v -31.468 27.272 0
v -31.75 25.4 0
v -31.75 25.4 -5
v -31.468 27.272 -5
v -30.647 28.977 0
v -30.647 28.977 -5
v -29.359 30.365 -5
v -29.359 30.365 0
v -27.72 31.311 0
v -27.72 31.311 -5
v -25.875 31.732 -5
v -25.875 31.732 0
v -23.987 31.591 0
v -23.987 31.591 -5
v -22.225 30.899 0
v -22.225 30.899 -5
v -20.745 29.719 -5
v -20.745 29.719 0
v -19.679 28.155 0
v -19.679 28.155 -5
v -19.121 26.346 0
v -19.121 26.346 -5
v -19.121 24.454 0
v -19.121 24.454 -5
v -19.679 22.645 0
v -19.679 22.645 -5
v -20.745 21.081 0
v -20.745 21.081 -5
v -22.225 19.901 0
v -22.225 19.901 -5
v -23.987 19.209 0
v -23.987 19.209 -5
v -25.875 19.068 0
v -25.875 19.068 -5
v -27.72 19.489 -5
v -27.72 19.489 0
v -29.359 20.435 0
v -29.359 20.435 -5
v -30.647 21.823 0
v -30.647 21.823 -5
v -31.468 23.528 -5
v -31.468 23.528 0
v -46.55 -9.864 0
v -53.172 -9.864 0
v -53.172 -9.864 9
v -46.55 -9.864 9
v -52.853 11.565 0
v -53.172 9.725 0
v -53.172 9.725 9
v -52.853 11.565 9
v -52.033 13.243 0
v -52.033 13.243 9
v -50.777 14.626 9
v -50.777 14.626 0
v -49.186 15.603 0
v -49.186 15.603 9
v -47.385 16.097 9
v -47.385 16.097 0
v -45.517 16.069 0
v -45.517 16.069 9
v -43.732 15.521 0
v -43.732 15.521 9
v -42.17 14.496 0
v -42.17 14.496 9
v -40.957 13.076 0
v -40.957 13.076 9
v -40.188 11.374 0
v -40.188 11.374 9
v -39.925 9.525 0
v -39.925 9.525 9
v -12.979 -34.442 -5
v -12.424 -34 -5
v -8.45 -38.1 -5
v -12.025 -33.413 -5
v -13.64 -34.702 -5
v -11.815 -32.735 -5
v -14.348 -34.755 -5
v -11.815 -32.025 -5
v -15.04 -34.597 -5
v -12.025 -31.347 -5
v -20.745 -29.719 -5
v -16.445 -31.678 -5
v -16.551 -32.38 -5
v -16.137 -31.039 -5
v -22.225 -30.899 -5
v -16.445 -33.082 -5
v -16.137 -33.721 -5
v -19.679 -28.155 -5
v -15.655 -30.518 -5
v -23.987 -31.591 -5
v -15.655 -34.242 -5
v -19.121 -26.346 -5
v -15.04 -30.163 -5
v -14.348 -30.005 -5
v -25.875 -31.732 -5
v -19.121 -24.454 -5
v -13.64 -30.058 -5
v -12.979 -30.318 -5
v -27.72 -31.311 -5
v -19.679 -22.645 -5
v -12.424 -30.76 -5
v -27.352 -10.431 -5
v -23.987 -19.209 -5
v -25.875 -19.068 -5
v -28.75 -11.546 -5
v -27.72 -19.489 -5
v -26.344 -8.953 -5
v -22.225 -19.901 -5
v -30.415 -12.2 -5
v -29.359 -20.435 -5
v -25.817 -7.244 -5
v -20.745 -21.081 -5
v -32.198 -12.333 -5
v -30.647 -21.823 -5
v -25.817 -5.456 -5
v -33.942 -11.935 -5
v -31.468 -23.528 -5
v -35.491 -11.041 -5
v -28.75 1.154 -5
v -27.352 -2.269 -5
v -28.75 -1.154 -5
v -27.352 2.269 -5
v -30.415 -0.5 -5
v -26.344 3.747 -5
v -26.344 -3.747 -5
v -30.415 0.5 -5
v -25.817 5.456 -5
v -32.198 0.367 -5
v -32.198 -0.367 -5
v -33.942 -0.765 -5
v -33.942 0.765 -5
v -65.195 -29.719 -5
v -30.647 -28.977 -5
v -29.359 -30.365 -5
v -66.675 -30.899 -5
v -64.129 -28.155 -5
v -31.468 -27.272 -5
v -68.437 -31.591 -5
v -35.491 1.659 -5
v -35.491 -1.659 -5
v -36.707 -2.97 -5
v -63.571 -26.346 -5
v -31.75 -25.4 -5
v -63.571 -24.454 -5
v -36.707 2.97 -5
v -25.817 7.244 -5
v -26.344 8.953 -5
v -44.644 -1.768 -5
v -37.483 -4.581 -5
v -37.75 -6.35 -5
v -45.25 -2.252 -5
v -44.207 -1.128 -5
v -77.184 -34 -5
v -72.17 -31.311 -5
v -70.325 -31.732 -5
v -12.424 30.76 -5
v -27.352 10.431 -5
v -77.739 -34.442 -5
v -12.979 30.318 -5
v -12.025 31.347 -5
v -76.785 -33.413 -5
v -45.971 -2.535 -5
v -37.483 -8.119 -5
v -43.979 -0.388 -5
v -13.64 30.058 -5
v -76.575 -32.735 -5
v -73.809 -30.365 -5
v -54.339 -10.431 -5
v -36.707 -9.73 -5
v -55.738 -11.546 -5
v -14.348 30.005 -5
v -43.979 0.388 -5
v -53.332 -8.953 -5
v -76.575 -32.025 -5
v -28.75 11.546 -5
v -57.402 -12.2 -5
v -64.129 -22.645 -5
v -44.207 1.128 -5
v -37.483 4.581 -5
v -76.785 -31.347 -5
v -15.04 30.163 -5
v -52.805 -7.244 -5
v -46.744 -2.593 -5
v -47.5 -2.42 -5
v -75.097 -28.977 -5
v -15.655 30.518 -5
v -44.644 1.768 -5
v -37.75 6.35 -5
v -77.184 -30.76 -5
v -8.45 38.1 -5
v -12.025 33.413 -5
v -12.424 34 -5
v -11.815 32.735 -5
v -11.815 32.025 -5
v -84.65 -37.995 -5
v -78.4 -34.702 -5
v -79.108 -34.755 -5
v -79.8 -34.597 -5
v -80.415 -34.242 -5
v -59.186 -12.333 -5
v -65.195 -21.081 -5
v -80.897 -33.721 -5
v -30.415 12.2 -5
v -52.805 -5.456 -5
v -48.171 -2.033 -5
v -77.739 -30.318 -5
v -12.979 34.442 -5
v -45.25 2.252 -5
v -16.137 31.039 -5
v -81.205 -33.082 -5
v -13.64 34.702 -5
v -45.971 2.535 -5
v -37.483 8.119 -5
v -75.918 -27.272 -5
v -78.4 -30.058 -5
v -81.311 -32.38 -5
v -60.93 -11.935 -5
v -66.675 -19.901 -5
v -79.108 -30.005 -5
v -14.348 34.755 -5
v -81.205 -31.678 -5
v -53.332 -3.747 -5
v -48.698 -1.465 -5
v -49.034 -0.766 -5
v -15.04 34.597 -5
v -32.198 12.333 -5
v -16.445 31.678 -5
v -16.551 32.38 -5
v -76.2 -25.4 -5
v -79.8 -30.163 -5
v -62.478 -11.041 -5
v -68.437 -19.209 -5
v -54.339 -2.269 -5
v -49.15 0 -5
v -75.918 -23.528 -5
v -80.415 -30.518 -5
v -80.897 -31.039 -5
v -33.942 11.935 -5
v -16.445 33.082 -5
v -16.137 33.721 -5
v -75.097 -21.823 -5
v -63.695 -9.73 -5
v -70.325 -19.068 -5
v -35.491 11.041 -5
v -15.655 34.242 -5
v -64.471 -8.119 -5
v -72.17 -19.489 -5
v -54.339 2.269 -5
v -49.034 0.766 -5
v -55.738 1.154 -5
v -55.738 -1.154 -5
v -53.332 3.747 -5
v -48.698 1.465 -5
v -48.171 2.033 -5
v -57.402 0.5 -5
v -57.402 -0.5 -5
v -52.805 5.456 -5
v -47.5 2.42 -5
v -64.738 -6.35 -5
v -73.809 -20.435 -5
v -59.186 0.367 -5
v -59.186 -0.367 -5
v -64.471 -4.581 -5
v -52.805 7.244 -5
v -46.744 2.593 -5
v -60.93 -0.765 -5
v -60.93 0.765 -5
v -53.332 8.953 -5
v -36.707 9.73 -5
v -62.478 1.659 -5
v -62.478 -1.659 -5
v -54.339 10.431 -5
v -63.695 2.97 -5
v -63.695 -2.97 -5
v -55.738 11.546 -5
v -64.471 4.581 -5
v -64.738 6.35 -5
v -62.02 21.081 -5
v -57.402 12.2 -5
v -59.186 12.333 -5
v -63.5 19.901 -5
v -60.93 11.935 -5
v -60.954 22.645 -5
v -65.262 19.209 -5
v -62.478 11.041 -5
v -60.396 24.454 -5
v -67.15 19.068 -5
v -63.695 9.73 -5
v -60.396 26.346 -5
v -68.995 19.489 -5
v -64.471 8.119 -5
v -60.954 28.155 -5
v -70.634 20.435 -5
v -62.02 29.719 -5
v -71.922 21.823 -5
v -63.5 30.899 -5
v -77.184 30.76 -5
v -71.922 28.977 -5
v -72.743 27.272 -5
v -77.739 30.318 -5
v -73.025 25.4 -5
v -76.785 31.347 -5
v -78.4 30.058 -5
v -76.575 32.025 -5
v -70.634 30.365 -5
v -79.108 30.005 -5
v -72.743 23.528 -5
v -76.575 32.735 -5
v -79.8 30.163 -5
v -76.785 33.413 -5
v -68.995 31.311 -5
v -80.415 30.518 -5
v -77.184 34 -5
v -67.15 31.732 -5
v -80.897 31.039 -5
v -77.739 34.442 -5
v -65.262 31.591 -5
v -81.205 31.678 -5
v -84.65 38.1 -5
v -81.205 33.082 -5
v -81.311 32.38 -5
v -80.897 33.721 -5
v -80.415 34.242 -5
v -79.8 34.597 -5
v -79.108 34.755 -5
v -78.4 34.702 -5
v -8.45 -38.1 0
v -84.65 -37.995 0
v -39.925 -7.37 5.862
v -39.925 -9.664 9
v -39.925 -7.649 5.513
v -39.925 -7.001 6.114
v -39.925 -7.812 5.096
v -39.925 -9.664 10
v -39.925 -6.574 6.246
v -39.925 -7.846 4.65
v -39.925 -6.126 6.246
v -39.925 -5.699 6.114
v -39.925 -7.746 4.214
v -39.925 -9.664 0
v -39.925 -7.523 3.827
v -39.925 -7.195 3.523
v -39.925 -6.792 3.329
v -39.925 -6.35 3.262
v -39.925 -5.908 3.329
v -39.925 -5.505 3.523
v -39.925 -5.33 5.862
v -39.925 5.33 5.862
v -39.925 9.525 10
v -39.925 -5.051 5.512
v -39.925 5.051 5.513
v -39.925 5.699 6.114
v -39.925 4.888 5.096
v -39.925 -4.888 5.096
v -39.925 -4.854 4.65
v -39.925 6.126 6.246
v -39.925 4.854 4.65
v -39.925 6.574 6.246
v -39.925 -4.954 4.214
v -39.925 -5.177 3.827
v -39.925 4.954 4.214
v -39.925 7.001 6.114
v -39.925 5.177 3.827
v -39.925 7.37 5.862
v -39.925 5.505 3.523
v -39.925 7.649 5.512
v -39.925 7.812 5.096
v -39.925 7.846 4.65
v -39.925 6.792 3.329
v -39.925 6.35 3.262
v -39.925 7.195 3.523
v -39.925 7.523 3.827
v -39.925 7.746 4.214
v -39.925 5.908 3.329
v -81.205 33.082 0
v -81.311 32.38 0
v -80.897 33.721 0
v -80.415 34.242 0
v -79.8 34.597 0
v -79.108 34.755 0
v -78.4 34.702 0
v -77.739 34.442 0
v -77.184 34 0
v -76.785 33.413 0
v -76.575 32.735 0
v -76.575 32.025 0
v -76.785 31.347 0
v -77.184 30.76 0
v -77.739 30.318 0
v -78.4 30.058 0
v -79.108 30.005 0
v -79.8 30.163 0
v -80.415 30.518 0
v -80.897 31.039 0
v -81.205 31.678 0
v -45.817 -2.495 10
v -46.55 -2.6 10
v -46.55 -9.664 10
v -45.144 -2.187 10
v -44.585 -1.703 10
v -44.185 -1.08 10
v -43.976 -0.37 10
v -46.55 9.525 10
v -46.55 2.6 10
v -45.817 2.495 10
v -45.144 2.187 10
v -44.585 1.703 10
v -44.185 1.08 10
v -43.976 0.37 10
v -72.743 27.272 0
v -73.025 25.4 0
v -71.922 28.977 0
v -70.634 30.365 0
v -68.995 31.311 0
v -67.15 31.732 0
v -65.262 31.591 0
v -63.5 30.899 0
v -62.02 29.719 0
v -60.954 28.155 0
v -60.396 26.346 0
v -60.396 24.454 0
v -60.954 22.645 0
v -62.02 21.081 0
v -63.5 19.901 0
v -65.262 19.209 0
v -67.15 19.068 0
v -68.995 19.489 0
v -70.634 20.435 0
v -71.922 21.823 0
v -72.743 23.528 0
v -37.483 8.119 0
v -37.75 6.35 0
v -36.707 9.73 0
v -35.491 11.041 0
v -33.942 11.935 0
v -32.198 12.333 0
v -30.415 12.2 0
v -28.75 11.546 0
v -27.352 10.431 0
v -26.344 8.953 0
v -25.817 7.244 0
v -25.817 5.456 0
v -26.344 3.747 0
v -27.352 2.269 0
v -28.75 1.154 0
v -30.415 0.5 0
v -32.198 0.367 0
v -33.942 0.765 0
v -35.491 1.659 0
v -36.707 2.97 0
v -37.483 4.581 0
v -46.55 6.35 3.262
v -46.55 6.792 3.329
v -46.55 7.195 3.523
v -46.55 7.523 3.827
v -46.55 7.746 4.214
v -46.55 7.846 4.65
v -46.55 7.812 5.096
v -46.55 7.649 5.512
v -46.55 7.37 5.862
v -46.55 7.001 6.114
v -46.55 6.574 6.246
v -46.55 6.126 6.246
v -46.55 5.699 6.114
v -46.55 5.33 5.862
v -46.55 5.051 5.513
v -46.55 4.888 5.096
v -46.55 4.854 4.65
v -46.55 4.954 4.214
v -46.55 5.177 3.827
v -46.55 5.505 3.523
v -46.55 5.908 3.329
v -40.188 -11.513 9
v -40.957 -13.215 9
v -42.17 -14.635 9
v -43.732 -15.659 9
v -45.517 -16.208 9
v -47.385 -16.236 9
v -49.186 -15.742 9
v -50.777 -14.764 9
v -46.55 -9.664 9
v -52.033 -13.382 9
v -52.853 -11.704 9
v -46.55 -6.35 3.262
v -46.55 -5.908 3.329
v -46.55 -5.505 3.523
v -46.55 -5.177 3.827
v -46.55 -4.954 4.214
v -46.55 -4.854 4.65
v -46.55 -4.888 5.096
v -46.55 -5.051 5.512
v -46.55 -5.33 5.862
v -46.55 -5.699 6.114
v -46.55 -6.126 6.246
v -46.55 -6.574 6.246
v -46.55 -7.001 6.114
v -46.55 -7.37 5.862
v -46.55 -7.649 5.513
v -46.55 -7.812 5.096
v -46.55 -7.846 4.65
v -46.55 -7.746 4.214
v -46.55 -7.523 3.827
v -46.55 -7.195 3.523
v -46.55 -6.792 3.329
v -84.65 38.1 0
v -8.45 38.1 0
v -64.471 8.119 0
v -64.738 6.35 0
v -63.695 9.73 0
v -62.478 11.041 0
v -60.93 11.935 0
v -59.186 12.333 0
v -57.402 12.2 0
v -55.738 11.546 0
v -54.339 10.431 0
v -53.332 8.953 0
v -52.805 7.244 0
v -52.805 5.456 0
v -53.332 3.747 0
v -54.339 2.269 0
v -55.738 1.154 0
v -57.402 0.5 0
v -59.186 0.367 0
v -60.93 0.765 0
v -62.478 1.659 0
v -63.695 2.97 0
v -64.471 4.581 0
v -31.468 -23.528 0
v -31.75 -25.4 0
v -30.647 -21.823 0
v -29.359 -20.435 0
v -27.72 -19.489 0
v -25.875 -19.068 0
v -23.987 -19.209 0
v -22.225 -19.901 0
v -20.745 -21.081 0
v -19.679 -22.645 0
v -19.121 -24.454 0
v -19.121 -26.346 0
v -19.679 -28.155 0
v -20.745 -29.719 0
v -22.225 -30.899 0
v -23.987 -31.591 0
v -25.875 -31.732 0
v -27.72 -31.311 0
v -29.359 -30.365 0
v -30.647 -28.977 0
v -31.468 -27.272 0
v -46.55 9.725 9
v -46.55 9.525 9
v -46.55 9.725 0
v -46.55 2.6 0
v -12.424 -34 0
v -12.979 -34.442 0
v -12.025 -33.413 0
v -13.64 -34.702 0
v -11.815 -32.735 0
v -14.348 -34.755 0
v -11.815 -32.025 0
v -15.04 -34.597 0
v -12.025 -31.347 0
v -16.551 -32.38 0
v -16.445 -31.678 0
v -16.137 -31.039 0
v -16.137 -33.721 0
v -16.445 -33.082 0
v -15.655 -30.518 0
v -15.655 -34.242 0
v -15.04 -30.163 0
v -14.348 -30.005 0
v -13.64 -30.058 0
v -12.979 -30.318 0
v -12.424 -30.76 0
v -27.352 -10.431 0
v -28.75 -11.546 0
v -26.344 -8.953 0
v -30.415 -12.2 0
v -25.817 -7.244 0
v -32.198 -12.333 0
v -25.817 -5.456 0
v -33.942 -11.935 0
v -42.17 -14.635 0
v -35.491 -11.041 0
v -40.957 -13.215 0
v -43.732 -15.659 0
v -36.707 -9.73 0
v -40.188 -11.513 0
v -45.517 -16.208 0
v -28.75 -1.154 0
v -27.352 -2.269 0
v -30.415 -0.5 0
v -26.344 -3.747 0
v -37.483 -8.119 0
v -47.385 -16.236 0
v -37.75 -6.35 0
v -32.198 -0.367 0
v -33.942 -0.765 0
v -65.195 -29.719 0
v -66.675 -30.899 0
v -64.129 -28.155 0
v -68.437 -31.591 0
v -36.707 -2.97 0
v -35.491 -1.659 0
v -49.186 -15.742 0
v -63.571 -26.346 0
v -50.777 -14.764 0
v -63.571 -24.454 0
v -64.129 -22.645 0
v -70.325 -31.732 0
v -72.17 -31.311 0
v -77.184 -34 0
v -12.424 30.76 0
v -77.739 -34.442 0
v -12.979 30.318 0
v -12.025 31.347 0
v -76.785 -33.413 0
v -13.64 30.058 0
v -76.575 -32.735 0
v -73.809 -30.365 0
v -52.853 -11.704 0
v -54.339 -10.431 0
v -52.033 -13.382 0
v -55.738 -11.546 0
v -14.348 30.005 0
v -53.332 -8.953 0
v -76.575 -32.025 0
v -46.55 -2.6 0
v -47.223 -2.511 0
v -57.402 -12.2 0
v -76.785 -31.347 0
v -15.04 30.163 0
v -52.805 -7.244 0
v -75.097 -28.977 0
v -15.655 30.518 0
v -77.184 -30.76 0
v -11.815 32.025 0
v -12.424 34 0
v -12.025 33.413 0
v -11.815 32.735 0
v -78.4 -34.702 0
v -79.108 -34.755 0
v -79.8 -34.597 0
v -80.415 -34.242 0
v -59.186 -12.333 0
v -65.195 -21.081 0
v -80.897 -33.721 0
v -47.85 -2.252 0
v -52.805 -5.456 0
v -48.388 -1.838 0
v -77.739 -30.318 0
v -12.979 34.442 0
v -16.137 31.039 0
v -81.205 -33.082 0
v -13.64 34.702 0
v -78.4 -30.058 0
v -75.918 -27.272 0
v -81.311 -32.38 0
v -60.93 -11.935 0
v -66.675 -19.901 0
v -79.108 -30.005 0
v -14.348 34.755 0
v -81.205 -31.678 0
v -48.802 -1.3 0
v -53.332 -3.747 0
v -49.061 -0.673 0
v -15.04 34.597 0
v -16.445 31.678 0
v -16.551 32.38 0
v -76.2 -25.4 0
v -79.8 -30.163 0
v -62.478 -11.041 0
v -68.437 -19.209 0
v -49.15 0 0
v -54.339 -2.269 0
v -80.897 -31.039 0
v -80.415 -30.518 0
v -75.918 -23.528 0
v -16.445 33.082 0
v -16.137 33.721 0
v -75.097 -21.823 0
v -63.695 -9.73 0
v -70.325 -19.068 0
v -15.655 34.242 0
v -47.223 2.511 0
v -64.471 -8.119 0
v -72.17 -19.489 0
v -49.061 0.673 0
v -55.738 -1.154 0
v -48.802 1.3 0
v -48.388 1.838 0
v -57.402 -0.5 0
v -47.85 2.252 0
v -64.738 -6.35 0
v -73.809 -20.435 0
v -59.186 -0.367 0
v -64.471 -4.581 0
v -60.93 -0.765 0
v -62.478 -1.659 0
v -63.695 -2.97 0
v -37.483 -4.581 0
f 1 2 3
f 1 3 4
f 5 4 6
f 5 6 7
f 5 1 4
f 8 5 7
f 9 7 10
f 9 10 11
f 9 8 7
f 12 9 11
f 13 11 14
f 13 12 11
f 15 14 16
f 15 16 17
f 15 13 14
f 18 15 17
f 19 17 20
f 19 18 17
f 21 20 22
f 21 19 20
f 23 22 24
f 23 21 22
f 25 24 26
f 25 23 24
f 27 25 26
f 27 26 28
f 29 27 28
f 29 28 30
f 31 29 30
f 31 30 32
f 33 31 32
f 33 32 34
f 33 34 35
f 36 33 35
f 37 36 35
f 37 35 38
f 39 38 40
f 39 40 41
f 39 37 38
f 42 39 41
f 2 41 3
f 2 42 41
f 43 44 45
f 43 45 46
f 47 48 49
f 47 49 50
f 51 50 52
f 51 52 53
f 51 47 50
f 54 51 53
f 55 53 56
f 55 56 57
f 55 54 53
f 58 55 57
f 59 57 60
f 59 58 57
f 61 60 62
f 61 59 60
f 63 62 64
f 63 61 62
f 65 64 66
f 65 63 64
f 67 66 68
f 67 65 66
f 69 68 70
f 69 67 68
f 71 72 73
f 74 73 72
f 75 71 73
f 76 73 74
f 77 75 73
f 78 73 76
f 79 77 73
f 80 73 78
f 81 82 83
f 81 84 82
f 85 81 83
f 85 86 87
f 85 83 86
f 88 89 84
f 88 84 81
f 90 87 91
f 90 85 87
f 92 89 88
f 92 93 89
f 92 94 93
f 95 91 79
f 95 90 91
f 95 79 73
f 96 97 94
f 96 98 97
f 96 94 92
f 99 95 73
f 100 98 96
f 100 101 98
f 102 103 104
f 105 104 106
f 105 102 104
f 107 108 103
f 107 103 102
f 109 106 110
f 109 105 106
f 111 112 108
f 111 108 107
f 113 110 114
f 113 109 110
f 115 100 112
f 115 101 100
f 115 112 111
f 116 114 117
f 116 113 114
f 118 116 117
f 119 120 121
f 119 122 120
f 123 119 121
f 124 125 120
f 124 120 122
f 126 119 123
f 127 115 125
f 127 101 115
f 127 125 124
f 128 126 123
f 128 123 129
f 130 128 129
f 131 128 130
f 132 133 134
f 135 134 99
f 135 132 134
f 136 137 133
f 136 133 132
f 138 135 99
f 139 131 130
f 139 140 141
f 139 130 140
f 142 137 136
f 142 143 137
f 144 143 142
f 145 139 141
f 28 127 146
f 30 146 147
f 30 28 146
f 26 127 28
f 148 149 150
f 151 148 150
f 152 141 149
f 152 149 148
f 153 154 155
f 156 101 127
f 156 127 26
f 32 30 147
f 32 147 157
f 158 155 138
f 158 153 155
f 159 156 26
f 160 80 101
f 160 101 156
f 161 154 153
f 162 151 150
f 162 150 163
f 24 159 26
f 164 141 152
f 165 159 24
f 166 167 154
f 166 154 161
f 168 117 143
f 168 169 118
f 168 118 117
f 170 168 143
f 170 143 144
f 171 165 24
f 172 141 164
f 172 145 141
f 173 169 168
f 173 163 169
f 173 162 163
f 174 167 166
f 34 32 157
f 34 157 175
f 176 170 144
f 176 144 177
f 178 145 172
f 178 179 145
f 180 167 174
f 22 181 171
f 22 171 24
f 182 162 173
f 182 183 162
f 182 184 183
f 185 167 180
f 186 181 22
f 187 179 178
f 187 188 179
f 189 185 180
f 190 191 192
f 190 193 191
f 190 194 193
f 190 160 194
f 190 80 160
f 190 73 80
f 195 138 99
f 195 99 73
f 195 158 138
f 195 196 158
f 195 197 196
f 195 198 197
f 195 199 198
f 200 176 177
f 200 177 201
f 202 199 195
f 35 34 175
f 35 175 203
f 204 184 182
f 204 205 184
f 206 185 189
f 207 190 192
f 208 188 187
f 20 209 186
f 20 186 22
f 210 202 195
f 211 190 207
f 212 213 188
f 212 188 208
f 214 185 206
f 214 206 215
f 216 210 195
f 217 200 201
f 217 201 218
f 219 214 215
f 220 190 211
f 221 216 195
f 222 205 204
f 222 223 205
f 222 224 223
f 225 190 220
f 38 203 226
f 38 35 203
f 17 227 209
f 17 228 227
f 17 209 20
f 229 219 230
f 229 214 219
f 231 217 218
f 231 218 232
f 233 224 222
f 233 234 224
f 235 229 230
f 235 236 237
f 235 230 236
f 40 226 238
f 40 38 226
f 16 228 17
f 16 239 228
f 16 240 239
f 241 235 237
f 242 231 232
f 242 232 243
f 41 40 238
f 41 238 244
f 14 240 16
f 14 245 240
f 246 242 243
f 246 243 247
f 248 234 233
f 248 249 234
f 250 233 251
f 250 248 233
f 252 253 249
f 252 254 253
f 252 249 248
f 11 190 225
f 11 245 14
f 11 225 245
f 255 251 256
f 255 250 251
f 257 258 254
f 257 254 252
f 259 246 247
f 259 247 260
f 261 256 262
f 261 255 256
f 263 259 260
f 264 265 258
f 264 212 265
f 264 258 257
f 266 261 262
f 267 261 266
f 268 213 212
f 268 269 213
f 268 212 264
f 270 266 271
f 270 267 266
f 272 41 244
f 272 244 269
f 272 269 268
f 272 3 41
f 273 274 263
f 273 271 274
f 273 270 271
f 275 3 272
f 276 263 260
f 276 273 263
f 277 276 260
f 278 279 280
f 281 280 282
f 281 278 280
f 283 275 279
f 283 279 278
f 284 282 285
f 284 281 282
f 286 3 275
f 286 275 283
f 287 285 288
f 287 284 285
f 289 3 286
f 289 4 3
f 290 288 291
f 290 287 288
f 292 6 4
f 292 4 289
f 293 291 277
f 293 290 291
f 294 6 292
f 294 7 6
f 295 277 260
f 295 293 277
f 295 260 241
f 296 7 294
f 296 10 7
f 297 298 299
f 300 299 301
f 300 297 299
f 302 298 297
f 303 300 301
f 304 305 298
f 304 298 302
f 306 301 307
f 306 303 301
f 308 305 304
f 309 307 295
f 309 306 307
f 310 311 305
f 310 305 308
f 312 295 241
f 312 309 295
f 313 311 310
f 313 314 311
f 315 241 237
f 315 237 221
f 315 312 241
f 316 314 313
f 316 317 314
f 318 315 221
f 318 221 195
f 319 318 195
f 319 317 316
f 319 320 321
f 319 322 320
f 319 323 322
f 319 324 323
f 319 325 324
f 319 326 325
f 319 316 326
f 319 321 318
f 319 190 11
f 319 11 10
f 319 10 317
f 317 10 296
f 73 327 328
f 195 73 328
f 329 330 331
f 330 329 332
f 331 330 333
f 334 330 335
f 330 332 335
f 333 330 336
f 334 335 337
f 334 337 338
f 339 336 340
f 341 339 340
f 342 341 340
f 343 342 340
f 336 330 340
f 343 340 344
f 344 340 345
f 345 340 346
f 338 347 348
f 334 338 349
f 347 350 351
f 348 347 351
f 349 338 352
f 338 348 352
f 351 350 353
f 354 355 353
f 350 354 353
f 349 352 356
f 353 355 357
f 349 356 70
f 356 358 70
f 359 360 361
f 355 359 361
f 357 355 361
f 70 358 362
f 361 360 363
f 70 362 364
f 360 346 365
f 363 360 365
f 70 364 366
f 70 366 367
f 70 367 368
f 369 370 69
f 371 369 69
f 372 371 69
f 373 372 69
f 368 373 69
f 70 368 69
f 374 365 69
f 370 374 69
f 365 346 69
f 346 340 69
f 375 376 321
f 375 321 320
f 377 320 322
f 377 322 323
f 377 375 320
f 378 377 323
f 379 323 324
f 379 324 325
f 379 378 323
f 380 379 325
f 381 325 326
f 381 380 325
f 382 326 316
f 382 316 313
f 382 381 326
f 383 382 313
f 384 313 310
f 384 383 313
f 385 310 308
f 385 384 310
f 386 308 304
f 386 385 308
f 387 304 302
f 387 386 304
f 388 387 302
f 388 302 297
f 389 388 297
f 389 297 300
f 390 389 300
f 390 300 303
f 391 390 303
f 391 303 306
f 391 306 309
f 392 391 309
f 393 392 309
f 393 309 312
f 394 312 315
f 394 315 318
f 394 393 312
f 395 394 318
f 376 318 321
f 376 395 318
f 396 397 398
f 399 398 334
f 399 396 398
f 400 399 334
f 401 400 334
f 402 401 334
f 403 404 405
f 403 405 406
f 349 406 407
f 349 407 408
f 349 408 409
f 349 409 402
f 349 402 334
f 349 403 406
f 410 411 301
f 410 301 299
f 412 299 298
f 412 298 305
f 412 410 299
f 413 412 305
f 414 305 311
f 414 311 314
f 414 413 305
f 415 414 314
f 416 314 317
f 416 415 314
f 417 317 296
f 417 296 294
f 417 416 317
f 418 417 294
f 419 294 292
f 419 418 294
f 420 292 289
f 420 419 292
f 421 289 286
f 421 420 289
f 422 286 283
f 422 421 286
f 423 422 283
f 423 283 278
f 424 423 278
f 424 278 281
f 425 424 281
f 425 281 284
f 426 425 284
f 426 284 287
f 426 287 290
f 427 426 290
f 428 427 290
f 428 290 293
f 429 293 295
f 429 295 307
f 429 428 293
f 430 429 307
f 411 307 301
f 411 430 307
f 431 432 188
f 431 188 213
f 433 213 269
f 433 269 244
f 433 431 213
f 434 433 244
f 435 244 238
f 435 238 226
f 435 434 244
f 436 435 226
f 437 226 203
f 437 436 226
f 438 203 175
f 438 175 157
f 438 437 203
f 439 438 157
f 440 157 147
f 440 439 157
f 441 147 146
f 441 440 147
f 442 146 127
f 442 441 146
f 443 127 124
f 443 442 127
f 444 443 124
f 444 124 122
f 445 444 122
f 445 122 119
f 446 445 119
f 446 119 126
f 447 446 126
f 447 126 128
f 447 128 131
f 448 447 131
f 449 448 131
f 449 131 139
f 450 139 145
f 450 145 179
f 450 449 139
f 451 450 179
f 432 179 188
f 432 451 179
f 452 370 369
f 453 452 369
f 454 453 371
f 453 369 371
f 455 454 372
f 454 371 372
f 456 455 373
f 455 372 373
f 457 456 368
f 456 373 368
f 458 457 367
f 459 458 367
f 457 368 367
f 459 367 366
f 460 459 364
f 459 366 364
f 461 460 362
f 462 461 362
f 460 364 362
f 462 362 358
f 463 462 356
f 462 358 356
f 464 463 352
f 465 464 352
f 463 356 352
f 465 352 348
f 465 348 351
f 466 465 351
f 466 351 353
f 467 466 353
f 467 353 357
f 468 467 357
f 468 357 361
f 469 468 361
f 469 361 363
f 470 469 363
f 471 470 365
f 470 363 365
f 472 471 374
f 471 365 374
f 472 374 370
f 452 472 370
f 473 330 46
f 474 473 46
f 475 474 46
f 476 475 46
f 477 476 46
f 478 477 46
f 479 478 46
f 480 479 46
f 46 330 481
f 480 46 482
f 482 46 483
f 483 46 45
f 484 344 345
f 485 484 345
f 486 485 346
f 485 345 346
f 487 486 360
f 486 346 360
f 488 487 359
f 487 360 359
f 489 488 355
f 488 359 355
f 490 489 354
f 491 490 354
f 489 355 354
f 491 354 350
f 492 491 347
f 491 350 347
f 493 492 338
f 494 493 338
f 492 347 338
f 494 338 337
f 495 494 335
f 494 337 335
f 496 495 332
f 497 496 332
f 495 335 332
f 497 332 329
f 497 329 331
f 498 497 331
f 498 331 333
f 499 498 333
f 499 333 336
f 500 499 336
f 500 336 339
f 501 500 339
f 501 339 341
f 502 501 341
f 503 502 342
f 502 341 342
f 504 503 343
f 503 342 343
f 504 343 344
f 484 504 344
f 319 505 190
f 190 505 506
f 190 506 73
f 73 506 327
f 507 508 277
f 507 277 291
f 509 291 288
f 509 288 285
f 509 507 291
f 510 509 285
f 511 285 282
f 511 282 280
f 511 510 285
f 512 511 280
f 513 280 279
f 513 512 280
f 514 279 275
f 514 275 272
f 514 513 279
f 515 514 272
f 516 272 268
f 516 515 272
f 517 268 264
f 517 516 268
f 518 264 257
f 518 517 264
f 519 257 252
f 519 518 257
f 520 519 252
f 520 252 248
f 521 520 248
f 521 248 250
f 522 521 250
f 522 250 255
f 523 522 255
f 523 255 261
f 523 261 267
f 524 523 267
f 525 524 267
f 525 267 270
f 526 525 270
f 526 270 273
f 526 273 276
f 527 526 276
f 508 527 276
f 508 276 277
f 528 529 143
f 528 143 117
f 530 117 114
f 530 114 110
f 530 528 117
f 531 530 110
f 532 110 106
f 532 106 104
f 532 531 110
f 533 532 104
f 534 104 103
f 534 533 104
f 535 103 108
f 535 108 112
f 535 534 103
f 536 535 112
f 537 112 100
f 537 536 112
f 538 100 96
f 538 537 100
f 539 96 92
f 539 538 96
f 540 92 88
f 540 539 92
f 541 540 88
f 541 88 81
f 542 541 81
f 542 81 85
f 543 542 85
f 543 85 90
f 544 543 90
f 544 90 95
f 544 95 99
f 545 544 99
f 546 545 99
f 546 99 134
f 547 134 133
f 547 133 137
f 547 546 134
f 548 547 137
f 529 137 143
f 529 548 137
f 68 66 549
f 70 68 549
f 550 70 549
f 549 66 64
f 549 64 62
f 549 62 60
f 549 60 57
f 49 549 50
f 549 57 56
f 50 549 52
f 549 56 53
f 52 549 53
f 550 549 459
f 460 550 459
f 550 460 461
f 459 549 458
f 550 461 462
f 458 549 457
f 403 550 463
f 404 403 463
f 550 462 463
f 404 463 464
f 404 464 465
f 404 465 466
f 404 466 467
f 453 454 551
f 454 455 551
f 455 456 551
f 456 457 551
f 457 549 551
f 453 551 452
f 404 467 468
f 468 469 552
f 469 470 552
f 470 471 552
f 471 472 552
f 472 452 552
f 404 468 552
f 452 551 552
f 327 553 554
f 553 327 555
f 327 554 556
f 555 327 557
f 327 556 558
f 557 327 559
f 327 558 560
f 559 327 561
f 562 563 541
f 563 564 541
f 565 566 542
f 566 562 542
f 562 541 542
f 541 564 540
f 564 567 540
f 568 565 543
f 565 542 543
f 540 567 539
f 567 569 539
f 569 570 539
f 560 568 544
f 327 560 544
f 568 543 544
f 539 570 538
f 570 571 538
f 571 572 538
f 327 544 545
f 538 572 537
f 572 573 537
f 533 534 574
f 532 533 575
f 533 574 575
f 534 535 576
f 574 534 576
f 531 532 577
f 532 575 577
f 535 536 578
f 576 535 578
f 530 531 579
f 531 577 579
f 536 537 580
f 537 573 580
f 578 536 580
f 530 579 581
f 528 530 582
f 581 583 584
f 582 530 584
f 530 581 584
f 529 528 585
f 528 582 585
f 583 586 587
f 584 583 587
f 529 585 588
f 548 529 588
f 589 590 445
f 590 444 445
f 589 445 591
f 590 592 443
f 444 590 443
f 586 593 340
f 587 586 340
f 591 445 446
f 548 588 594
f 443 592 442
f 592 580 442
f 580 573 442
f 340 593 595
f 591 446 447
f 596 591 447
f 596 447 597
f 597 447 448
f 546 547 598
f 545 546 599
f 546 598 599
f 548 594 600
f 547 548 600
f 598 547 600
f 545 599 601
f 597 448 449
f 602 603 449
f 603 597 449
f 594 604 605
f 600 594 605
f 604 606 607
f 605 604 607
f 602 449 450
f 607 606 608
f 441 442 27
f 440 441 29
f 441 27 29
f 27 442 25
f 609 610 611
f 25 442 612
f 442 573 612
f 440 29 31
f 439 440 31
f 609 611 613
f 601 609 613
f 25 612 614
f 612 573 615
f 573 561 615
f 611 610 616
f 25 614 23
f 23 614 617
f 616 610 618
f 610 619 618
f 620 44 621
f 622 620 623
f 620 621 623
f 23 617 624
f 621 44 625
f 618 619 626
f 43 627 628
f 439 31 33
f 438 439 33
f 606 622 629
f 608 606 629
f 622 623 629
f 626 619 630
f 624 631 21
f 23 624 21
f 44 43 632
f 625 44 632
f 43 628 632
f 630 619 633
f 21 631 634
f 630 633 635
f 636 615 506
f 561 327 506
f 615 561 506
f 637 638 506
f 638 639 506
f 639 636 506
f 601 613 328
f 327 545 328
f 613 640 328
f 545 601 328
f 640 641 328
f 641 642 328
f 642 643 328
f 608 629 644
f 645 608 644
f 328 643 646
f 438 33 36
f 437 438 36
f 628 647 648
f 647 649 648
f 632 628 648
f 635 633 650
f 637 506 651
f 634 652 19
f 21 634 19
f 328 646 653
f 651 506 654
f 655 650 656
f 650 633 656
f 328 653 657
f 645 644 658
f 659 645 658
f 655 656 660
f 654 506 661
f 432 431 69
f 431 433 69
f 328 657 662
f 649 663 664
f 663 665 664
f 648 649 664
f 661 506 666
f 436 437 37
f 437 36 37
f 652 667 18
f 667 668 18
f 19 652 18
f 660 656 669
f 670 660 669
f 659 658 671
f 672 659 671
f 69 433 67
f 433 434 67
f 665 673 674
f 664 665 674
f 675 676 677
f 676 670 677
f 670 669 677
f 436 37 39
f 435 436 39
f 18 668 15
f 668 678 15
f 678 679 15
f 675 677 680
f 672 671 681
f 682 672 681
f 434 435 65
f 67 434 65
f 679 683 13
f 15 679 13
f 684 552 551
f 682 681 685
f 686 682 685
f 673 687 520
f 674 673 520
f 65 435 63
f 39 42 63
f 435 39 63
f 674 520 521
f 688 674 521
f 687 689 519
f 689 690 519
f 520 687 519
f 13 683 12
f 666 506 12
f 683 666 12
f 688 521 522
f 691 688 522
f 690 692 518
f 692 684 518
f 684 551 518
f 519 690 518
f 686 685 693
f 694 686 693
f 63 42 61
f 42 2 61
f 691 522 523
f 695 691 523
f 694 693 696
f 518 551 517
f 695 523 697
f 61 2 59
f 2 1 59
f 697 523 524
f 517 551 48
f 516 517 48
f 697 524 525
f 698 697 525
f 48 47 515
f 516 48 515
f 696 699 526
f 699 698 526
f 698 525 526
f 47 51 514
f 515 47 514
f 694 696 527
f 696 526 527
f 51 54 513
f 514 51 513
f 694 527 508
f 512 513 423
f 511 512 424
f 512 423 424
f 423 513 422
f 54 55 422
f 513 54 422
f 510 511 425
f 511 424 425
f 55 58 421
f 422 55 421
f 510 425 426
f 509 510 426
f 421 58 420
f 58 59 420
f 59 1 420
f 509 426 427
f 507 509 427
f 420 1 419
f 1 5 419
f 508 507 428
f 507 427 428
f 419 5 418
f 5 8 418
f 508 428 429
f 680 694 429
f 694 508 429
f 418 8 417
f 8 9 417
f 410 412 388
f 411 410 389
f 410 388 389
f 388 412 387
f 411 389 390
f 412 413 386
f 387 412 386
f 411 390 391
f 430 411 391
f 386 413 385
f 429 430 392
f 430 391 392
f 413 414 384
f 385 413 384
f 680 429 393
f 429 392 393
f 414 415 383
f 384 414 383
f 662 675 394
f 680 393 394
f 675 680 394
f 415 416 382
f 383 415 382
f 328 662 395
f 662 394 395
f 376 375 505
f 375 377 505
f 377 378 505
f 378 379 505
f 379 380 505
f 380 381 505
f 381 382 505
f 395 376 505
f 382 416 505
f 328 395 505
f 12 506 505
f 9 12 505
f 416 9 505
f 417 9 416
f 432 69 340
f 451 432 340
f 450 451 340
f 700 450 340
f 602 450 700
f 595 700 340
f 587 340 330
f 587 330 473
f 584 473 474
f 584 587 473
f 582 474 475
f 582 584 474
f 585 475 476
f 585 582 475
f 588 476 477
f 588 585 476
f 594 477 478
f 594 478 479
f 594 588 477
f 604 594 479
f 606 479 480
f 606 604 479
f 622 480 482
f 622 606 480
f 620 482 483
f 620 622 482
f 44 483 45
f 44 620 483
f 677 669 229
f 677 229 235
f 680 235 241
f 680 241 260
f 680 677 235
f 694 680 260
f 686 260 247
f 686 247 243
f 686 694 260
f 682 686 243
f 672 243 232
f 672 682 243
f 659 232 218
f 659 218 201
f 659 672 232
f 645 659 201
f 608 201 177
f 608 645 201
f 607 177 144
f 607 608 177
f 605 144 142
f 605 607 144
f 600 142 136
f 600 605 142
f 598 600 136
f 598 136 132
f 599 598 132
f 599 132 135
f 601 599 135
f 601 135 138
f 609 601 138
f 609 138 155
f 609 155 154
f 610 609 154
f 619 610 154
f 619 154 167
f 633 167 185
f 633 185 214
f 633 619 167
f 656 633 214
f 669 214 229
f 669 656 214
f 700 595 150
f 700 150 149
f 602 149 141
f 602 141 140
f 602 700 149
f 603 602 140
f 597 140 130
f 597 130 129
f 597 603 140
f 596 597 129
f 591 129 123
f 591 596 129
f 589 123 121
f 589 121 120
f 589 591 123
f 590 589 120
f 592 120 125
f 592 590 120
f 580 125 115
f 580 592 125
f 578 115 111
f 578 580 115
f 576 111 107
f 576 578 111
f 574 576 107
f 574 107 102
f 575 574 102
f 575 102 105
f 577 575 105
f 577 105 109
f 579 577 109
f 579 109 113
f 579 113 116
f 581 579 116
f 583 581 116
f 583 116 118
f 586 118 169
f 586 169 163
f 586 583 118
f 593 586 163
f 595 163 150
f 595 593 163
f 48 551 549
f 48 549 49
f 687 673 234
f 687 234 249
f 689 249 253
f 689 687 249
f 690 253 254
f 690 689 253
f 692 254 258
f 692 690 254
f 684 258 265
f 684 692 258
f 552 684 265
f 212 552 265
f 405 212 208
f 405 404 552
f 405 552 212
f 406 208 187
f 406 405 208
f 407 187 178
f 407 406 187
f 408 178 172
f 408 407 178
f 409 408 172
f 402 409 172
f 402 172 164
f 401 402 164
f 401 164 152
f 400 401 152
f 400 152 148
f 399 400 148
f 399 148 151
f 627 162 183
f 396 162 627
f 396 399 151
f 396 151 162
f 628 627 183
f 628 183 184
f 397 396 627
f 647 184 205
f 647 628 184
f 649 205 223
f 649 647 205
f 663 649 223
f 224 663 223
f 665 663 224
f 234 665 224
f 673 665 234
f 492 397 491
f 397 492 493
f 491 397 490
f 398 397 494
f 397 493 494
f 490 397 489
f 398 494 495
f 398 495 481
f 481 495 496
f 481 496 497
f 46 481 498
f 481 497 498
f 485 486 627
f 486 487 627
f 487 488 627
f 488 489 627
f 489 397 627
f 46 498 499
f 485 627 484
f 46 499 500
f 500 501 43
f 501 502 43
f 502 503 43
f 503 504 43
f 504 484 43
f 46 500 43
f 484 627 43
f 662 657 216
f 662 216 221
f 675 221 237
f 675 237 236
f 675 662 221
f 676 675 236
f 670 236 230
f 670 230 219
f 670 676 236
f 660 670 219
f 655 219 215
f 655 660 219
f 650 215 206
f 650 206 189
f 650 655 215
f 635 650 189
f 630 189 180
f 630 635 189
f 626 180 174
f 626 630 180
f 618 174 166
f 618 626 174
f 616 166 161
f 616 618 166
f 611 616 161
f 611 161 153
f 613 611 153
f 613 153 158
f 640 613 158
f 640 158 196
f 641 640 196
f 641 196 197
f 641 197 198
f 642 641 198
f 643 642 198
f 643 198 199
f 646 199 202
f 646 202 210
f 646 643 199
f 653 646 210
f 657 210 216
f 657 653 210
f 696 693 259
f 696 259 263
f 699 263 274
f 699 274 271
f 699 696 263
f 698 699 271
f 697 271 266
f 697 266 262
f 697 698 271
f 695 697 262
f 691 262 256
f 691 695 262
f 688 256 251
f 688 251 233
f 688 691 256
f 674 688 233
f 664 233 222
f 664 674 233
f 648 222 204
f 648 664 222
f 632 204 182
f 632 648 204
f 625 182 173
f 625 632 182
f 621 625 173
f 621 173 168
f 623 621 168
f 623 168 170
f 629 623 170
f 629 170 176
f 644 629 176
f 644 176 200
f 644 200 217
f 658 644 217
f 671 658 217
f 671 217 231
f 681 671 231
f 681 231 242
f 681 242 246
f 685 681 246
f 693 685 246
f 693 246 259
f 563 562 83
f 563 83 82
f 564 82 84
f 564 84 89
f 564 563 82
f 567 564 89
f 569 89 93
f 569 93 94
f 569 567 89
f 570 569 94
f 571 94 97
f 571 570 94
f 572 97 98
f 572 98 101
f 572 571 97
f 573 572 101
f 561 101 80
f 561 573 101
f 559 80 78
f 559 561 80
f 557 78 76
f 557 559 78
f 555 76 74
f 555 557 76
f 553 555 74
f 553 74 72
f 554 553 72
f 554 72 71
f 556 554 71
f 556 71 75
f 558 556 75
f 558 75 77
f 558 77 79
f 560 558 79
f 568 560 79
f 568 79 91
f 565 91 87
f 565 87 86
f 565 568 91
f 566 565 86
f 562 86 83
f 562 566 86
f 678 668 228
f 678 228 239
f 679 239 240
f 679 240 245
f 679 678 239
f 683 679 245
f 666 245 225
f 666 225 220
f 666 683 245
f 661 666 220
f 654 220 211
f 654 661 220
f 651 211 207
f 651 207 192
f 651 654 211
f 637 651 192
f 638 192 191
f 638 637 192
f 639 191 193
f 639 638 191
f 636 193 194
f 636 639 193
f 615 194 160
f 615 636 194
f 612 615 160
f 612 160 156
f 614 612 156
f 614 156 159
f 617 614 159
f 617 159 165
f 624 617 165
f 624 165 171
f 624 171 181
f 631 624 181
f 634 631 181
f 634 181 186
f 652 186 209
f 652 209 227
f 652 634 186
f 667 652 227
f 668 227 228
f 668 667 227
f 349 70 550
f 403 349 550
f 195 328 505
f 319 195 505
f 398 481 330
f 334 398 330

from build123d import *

# Parameters (mm, degrees)
EXTRUDE1_DEPTH = 10
SKETCH7_R      = 1.5
EXTRUDE3_DEPTH = 6.625
SKETCH6_R      = 2.38125
SKETCH6_R_2    = 2.6
SKETCH6_R_3    = 6.35
SKETCH6_R_4    = 6
EXTRUDE2_DEPTH = 5
EXTRUDE4_DEPTH = 9
EXTRUDE5_DEPTH = 9


with BuildPart() as part:
    # Sketch5 → Extrude1 (new body)
    with BuildSketch(Plane.XY):
        with BuildLine():
            Line((-46.55, -2.6), (-46.55, -9.663597854))
            Line((-46.55, -9.663597854), (-39.925, -9.663597854))
            Line((-39.925, -9.663597854), (-39.925, 9.525))
            Line((-39.925, 9.525), (-46.55, 9.525))
            Line((-46.55, 9.525), (-46.55, 2.6))
            ThreePointArc((-46.55, 2.6), (-43.95, 0), (-46.55, -2.6))
        make_face()
    extrude(amount=EXTRUDE1_DEPTH)

    # Sketch7 → Extrude3 (cut)
    with BuildSketch(Plane(origin=(-39.925, 0, 0), x_dir=(0, 0, -1), z_dir=(1, 0, 0))):
        with Locations((-4.7625, 6.35)):
            Circle(SKETCH7_R)
        with Locations((-4.7625, -6.35)):
            Circle(SKETCH7_R)
    extrude(amount=-EXTRUDE3_DEPTH, mode=Mode.SUBTRACT)

    # Sketch6 → Extrude2 (add)
    with BuildSketch(Plane(origin=(0, 0, 0), x_dir=(-1, 0, 0), z_dir=(0, 0, -1))):
        Polygon((84.65, 38.1), (8.45, 38.1), (8.45, -38.1), (84.65, -37.995357572), align=None)
        with Locations((78.93, -32.38)):
            Circle(SKETCH6_R, mode=Mode.SUBTRACT)
        with Locations((14.17, -32.38)):
            Circle(SKETCH6_R, mode=Mode.SUBTRACT)
        with Locations((14.17, 32.38)):
            Circle(SKETCH6_R, mode=Mode.SUBTRACT)
        with Locations((78.93, 32.38)):
            Circle(SKETCH6_R, mode=Mode.SUBTRACT)
        with Locations((46.55, 0)):
            Circle(SKETCH6_R_2, mode=Mode.SUBTRACT)
        with Locations((69.85, -25.4)):
            Circle(SKETCH6_R_3, mode=Mode.SUBTRACT)
        with Locations((66.675, 25.4)):
            Circle(SKETCH6_R_3, mode=Mode.SUBTRACT)
        with Locations((25.4, 25.4)):
            Circle(SKETCH6_R_3, mode=Mode.SUBTRACT)
        with Locations((25.4, -25.4)):
            Circle(SKETCH6_R_3, mode=Mode.SUBTRACT)
        with Locations((58.7375, -6.35)):
            Circle(SKETCH6_R_4, mode=Mode.SUBTRACT)
        with Locations((58.7375, 6.35)):
            Circle(SKETCH6_R_4, mode=Mode.SUBTRACT)
        with Locations((31.75, -6.35)):
            Circle(SKETCH6_R_4, mode=Mode.SUBTRACT)
        with Locations((31.75, 6.35)):
            Circle(SKETCH6_R_4, mode=Mode.SUBTRACT)
    extrude(amount=EXTRUDE2_DEPTH)

    # Sketch9 → Extrude4 (add)
    with BuildSketch(Plane.XY):
        with BuildLine():
            Line((-53.175, -9.663597854), (-39.925, -9.663597854))
            ThreePointArc((-39.925, -9.663597854), (-46.55, -16.288597854), (-53.175, -9.663597854))
        make_face()
        with BuildLine():
            Line((-39.925, 9.525), (-53.175, 9.525))
            ThreePointArc((-53.175, 9.525), (-46.55, 16.15), (-39.925, 9.525))
        make_face()
    extrude(amount=EXTRUDE4_DEPTH)

    # Sketch10 → Extrude5 (cut)
    with BuildSketch(Plane.XY.offset(9)):
        Polygon((-46.55, 9.525), (-46.55, 9.725), (-53.997578108, 9.725), (-53.997578108, -9.863597854), (-46.55, -9.863597854), (-46.55, -9.663597854), align=None)
    extrude(amount=-EXTRUDE5_DEPTH, mode=Mode.SUBTRACT)


solid = part.part
